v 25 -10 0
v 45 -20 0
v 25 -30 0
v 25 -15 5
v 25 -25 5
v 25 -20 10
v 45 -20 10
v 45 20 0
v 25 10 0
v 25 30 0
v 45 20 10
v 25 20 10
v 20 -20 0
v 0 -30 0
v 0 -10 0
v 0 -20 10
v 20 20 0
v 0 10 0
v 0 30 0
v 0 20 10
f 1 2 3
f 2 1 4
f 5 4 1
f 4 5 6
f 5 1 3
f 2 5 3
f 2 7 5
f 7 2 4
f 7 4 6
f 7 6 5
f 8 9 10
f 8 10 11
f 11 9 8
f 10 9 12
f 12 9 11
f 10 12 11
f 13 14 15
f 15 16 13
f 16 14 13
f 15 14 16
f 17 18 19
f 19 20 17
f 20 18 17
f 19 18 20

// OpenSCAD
// linear_extrude tests with scale to 0 on different axes. 
// Test updated with additional cases for PR #3351 - Hans Loeblich
module tri() { polygon([[20, 0],[0, 10],[0, -10]]); }

// Original test had the following single geometry:
translate([ 25,-20]) linear_extrude(height = 10, scale = [1,0], slices = 2) tri();
// Newly added cases:
translate([ 25, 20]) linear_extrude(height = 10, scale = [1,0], slices = 1) tri();
translate([  0,-20]) linear_extrude(height = 10, scale = [0,0], slices = 2) tri();
translate([  0, 20]) linear_extrude(height = 10, scale = [0,0], slices = 1) tri();  

// FIXME: the following two cases preview ok, but render with non-manifold warning.
// TEST_GENERATE only makes blank images for monotonepngtest and stlcgalpngtest
// while the "actual" images contain all objects, so those tests fail.
// I think export/import is involved in generating those expected images and that's failing?
/*
translate([-25,-20]) linear_extrude(height = 10, scale = [0,1], slices = 2) tri();
translate([-25, 20]) linear_extrude(height = 10, scale = [0,1], slices = 1) tri();
//*/
